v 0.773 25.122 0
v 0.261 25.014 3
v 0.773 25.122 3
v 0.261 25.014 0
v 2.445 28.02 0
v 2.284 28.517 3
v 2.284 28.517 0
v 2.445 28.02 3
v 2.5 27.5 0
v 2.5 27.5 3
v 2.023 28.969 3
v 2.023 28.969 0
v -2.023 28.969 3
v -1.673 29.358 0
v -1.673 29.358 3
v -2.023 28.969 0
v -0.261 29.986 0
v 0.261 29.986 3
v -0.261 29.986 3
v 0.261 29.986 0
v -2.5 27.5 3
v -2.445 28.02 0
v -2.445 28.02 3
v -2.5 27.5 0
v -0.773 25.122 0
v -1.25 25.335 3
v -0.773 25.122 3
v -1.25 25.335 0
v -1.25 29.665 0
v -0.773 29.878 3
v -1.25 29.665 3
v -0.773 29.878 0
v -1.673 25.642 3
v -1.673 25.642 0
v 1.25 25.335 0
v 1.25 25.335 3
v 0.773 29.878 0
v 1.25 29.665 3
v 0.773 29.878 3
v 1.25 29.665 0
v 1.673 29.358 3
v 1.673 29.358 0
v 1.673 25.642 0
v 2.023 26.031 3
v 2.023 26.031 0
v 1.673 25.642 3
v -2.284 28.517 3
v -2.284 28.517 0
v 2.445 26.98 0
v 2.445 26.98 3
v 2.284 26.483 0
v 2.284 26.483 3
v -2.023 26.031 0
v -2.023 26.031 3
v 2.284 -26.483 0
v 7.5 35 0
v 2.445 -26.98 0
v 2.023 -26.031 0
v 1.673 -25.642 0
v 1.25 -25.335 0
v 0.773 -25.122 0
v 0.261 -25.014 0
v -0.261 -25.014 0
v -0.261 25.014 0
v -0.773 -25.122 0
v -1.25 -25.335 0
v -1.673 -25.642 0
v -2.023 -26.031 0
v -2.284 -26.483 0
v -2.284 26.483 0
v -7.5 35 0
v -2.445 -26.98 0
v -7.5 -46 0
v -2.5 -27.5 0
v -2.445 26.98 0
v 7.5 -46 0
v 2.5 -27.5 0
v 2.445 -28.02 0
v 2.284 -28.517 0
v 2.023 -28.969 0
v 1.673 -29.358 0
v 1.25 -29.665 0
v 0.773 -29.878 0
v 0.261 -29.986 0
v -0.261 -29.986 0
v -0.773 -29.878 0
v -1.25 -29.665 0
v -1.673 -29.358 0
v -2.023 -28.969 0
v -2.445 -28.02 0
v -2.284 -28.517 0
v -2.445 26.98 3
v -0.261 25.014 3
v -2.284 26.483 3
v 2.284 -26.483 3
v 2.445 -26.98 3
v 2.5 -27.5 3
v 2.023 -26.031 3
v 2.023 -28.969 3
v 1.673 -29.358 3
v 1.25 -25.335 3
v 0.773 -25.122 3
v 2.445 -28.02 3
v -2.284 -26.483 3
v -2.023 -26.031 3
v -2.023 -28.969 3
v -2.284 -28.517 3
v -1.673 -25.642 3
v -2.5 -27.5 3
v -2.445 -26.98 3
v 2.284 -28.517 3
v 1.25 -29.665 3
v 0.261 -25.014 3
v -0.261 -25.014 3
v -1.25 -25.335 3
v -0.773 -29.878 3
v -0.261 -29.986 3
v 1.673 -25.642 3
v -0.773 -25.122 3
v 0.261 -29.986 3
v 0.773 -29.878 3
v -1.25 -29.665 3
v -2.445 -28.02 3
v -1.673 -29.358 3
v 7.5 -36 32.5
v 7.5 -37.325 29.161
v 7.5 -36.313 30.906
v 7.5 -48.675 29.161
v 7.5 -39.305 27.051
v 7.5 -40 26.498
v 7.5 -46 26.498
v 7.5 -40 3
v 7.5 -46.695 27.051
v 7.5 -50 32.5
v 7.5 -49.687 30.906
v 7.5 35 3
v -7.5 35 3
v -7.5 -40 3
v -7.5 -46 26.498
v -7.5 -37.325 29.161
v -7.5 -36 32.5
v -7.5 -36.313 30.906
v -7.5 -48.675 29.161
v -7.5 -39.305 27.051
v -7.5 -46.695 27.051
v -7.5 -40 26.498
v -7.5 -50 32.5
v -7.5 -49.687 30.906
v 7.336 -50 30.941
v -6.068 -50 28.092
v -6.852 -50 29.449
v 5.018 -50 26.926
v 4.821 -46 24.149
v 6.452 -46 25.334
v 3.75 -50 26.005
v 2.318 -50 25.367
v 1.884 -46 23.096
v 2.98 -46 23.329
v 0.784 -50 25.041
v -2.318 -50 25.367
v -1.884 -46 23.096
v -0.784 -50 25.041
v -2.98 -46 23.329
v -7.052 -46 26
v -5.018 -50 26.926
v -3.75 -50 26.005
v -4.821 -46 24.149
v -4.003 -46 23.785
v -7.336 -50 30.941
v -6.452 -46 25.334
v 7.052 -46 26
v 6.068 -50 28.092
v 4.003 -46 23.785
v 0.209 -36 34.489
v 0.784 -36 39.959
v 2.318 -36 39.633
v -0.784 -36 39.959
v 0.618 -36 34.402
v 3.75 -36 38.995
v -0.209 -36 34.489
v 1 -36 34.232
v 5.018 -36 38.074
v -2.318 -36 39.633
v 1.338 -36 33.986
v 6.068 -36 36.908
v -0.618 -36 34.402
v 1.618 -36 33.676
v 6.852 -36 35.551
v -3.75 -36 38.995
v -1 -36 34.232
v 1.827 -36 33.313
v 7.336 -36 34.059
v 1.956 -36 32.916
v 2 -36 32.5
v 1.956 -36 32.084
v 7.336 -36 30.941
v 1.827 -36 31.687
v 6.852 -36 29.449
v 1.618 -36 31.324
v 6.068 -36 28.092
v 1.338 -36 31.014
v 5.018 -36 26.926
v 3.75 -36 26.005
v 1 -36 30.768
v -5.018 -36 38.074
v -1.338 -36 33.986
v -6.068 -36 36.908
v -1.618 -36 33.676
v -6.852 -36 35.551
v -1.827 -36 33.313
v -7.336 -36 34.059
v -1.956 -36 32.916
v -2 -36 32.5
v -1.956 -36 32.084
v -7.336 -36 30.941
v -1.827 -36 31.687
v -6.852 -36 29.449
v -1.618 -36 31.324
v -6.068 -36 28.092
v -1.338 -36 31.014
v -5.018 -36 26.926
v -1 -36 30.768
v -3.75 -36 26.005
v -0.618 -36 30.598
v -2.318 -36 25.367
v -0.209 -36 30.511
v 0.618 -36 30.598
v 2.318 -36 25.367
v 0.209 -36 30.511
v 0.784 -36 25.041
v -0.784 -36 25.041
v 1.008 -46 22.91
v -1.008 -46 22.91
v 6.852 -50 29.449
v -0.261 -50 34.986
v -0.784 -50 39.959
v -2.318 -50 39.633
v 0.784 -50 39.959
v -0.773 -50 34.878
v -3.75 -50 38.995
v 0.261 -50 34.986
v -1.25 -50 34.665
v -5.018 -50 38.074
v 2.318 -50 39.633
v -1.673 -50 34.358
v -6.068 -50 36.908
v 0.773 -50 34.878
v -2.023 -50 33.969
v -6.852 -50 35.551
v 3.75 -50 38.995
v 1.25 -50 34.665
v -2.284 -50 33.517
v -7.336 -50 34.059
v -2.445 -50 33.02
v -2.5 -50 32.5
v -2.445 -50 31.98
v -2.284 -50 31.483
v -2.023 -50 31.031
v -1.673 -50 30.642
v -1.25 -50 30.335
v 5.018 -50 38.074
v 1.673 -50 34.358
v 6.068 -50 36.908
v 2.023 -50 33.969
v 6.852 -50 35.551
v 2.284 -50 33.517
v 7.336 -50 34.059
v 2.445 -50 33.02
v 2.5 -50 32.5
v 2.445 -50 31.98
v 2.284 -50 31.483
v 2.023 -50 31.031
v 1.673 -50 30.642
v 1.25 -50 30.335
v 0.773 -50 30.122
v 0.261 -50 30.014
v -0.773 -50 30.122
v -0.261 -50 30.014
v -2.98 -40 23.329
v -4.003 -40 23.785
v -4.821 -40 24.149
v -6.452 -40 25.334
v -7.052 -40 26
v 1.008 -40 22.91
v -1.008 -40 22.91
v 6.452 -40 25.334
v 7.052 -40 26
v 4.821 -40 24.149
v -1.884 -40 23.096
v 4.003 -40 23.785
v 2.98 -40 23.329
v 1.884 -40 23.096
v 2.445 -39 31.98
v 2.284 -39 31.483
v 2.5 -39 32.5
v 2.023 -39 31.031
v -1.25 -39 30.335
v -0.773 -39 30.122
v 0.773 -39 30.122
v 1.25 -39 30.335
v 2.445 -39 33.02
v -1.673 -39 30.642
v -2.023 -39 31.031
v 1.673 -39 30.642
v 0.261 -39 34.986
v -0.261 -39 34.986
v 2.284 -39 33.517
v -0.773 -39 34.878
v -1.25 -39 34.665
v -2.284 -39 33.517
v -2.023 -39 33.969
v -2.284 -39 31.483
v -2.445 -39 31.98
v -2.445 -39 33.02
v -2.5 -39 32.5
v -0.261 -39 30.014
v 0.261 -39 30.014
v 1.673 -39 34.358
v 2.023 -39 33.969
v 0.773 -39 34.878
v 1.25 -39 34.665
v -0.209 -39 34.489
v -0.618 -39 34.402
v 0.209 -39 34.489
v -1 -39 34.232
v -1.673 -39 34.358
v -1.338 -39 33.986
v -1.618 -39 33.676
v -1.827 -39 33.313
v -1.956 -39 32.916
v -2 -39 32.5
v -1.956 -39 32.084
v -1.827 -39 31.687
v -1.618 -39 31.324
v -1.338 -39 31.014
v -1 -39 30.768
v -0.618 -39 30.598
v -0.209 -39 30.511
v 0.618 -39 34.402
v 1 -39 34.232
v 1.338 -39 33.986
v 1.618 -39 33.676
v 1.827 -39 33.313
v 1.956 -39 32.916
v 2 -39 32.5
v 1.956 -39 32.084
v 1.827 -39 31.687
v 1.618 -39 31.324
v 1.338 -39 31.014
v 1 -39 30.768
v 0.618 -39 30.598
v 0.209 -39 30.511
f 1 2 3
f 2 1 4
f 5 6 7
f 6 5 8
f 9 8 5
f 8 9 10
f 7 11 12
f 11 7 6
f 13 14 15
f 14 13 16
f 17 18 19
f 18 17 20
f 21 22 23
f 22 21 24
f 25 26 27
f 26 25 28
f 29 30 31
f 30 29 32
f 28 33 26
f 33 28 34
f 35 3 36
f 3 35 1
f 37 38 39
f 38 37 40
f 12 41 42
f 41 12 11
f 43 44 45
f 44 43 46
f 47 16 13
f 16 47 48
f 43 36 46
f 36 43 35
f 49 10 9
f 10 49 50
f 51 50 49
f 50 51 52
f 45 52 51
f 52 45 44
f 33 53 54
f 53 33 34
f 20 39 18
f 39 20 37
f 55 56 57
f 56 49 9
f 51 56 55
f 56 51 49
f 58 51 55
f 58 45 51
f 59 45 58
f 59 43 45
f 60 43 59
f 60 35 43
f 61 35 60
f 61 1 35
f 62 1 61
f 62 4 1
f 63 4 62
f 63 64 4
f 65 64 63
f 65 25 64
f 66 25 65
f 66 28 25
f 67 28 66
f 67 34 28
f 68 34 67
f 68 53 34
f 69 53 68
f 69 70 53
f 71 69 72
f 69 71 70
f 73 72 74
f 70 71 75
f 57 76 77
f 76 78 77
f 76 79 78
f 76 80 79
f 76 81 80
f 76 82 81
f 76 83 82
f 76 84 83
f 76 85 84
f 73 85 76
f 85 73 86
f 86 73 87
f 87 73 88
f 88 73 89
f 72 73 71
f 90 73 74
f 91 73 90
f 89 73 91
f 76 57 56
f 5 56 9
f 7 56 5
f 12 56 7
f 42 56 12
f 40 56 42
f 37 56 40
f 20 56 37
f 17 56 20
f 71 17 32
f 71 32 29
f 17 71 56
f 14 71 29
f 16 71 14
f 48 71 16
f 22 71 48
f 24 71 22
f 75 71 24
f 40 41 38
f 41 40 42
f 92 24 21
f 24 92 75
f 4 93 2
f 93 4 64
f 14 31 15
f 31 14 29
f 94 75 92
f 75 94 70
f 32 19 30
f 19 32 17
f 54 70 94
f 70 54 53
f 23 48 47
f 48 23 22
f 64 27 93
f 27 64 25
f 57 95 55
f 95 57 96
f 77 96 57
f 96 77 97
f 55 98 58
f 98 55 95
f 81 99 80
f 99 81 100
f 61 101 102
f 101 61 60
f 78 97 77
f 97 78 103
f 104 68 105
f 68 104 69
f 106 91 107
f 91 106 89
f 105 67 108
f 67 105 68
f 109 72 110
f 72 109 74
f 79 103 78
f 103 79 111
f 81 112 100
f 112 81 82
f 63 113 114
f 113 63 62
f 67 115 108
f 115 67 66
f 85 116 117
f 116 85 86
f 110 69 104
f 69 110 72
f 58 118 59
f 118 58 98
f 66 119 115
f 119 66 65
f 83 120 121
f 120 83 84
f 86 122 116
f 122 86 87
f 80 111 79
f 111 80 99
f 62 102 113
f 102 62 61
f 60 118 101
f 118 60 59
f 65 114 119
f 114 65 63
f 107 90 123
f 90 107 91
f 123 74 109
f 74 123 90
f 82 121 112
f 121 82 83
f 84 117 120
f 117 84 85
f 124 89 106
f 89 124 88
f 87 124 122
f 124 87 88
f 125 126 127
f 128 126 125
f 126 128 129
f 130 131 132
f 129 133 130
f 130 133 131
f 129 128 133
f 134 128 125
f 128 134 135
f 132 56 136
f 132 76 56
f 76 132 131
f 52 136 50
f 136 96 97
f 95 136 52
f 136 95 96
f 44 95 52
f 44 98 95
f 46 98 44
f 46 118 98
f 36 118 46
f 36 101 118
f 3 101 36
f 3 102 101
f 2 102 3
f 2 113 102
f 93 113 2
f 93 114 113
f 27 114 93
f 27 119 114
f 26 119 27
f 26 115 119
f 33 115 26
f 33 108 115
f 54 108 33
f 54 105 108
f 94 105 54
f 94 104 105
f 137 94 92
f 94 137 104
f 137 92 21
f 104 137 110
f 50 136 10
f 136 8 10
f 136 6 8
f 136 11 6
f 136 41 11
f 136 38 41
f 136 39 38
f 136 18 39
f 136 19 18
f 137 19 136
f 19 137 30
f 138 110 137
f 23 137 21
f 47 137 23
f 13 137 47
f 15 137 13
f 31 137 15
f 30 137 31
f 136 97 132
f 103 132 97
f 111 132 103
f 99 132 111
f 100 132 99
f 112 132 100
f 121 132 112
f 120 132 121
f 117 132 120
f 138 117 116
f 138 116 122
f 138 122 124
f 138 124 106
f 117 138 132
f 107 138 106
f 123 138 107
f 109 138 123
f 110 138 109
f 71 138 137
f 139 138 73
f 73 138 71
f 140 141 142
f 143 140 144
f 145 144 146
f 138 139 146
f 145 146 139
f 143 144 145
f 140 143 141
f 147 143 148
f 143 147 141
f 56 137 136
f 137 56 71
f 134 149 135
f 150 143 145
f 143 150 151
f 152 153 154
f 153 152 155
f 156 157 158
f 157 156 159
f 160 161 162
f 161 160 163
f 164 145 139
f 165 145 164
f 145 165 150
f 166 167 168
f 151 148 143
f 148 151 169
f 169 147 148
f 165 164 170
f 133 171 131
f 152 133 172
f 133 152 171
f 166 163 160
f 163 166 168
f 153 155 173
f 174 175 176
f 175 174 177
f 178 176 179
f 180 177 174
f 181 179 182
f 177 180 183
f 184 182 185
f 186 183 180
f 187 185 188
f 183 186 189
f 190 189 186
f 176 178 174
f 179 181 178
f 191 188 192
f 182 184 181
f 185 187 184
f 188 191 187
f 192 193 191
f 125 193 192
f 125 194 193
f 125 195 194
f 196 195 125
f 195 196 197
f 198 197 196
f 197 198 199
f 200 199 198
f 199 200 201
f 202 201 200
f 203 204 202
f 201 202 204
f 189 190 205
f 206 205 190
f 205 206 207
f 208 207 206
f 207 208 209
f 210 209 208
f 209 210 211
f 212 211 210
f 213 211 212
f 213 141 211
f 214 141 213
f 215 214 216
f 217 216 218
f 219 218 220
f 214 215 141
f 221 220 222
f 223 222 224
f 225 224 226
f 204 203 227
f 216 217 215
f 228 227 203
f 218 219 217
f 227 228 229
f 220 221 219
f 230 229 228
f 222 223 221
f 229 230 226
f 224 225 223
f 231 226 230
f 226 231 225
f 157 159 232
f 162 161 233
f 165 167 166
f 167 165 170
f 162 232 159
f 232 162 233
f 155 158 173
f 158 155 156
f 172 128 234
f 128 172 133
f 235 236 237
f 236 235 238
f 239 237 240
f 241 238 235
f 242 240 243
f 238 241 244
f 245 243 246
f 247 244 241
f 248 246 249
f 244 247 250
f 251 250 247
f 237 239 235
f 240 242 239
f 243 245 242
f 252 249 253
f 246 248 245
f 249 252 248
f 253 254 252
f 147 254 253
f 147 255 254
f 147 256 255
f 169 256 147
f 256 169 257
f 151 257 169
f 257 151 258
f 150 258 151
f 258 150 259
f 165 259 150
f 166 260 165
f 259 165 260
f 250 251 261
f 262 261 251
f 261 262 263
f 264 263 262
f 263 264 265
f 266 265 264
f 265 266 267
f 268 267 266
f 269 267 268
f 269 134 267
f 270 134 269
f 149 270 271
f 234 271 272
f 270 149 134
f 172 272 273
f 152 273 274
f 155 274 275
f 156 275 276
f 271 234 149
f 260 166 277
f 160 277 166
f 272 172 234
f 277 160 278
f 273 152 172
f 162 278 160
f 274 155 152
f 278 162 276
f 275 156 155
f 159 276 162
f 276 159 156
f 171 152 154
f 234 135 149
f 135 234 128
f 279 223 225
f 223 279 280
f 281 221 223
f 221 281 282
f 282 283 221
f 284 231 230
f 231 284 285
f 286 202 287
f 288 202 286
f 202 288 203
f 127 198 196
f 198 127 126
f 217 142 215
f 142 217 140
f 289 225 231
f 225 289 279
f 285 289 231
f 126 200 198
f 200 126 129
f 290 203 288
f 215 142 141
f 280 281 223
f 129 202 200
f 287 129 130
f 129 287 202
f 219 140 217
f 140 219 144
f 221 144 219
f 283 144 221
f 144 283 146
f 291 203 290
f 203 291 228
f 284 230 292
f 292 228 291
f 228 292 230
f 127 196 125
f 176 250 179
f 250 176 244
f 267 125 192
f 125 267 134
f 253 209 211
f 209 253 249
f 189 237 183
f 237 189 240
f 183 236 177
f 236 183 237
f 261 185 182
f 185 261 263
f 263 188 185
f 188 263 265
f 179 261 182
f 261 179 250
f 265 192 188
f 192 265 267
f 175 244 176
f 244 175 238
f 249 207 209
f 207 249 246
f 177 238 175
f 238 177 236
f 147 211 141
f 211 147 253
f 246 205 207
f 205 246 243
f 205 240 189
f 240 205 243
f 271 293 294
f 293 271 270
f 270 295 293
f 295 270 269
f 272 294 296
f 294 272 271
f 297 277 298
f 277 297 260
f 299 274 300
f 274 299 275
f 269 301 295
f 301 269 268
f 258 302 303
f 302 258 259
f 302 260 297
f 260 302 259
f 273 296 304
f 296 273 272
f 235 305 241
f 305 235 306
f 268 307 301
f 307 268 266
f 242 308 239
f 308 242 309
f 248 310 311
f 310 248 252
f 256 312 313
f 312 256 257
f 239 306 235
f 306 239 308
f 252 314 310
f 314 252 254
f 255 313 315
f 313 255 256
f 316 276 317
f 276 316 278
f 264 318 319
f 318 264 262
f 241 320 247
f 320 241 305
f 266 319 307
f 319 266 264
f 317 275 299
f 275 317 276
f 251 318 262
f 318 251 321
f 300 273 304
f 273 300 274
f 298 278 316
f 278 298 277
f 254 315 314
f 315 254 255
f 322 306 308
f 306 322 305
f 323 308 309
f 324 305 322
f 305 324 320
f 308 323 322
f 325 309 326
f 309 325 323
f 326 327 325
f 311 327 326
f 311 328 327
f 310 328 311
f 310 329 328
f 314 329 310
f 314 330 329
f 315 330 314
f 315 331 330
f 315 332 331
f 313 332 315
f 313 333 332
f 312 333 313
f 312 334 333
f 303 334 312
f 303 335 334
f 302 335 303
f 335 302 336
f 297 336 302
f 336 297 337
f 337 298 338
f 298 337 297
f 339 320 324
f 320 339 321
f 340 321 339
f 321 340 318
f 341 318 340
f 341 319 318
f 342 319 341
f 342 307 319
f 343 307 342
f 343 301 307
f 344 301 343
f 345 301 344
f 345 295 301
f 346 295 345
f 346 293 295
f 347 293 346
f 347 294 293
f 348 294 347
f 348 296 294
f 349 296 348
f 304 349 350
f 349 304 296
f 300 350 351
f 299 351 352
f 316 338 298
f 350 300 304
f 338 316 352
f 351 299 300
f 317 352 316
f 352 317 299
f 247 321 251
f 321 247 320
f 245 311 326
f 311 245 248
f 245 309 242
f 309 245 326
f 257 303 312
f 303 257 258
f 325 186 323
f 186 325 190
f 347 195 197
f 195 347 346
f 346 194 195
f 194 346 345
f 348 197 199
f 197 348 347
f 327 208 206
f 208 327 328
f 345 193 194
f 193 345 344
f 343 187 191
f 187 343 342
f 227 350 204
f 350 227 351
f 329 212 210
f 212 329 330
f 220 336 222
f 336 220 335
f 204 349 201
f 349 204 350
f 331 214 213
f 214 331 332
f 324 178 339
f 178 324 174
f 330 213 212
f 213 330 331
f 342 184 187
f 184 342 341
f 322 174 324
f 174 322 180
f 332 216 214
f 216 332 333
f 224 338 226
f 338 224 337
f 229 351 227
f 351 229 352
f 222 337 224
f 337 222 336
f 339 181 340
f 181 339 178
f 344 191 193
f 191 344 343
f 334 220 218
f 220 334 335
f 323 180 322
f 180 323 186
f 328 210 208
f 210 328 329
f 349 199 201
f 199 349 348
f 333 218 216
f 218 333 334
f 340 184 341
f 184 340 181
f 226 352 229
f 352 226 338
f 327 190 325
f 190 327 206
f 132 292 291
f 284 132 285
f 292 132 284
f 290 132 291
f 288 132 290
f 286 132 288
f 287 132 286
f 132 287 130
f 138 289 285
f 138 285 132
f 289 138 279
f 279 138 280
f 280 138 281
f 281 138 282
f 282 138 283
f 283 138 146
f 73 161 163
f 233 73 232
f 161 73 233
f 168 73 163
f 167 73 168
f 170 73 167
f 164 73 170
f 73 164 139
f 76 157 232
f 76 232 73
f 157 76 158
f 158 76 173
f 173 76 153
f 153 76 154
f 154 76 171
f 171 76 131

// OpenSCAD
// create a spacer for the new brass extruder assembly

// 15x70x3
length = 70;
hole_space=55;
hole_size=5;

feedBottomLength = 5;

feedVerticalHeight = 25;
feedVerticalLength = 6;
verticalYpos = -1*(feedBottomLength+feedVerticalLength+length/2);

// bottom section with holes
difference() {
    translate([-7.5,-1*(length/2),0])cube([15,length,3]);

    union() {
        translate([0, 1*(length/2-((length-hole_space)/2)),0])cylinder(d=hole_size,h=4,center=false, $fs=0.1);
        translate([0,-1*(length/2-((length-hole_space)/2)),0])cylinder(d=hole_size,h=4,center=false, $fs=0.1);
    }
}

// extra spacer
translate([-7.5,-1*(feedBottomLength+length/2),0])
cube([15,feedBottomLength,3]);

// vertical bar of feeder
translate([-7.5,verticalYpos,0])
cube([15,feedVerticalLength,feedVerticalHeight+2]);

// rounded part with hole
translate([0,verticalYpos-4,feedVerticalHeight])
translate([0,0,15/2])
rotate([-90,0,0])
difference() {
    union() {
        cylinder(r=15/2,h=feedVerticalLength+8, $fs=0.01);
        //translate([-7.5,0,0])
        //cube([15,15/2,feedVerticalLength]);

        intersection() {
            cylinder(r2=15,r1=15/2,h=feedVerticalLength+8);
            cylinder(r2=15/2,r1=15,h=feedVerticalLength+8);
            translate([-7.5,0,0])
            cube([15,15,feedVerticalLength+8]);
        }
    }
    union() {
        cylinder(r=5/2,h=feedVerticalLength+8-3, $fs=0.1);
        cylinder(r=2,h=feedVerticalLength+8, $fs=0.1);
    }
}
